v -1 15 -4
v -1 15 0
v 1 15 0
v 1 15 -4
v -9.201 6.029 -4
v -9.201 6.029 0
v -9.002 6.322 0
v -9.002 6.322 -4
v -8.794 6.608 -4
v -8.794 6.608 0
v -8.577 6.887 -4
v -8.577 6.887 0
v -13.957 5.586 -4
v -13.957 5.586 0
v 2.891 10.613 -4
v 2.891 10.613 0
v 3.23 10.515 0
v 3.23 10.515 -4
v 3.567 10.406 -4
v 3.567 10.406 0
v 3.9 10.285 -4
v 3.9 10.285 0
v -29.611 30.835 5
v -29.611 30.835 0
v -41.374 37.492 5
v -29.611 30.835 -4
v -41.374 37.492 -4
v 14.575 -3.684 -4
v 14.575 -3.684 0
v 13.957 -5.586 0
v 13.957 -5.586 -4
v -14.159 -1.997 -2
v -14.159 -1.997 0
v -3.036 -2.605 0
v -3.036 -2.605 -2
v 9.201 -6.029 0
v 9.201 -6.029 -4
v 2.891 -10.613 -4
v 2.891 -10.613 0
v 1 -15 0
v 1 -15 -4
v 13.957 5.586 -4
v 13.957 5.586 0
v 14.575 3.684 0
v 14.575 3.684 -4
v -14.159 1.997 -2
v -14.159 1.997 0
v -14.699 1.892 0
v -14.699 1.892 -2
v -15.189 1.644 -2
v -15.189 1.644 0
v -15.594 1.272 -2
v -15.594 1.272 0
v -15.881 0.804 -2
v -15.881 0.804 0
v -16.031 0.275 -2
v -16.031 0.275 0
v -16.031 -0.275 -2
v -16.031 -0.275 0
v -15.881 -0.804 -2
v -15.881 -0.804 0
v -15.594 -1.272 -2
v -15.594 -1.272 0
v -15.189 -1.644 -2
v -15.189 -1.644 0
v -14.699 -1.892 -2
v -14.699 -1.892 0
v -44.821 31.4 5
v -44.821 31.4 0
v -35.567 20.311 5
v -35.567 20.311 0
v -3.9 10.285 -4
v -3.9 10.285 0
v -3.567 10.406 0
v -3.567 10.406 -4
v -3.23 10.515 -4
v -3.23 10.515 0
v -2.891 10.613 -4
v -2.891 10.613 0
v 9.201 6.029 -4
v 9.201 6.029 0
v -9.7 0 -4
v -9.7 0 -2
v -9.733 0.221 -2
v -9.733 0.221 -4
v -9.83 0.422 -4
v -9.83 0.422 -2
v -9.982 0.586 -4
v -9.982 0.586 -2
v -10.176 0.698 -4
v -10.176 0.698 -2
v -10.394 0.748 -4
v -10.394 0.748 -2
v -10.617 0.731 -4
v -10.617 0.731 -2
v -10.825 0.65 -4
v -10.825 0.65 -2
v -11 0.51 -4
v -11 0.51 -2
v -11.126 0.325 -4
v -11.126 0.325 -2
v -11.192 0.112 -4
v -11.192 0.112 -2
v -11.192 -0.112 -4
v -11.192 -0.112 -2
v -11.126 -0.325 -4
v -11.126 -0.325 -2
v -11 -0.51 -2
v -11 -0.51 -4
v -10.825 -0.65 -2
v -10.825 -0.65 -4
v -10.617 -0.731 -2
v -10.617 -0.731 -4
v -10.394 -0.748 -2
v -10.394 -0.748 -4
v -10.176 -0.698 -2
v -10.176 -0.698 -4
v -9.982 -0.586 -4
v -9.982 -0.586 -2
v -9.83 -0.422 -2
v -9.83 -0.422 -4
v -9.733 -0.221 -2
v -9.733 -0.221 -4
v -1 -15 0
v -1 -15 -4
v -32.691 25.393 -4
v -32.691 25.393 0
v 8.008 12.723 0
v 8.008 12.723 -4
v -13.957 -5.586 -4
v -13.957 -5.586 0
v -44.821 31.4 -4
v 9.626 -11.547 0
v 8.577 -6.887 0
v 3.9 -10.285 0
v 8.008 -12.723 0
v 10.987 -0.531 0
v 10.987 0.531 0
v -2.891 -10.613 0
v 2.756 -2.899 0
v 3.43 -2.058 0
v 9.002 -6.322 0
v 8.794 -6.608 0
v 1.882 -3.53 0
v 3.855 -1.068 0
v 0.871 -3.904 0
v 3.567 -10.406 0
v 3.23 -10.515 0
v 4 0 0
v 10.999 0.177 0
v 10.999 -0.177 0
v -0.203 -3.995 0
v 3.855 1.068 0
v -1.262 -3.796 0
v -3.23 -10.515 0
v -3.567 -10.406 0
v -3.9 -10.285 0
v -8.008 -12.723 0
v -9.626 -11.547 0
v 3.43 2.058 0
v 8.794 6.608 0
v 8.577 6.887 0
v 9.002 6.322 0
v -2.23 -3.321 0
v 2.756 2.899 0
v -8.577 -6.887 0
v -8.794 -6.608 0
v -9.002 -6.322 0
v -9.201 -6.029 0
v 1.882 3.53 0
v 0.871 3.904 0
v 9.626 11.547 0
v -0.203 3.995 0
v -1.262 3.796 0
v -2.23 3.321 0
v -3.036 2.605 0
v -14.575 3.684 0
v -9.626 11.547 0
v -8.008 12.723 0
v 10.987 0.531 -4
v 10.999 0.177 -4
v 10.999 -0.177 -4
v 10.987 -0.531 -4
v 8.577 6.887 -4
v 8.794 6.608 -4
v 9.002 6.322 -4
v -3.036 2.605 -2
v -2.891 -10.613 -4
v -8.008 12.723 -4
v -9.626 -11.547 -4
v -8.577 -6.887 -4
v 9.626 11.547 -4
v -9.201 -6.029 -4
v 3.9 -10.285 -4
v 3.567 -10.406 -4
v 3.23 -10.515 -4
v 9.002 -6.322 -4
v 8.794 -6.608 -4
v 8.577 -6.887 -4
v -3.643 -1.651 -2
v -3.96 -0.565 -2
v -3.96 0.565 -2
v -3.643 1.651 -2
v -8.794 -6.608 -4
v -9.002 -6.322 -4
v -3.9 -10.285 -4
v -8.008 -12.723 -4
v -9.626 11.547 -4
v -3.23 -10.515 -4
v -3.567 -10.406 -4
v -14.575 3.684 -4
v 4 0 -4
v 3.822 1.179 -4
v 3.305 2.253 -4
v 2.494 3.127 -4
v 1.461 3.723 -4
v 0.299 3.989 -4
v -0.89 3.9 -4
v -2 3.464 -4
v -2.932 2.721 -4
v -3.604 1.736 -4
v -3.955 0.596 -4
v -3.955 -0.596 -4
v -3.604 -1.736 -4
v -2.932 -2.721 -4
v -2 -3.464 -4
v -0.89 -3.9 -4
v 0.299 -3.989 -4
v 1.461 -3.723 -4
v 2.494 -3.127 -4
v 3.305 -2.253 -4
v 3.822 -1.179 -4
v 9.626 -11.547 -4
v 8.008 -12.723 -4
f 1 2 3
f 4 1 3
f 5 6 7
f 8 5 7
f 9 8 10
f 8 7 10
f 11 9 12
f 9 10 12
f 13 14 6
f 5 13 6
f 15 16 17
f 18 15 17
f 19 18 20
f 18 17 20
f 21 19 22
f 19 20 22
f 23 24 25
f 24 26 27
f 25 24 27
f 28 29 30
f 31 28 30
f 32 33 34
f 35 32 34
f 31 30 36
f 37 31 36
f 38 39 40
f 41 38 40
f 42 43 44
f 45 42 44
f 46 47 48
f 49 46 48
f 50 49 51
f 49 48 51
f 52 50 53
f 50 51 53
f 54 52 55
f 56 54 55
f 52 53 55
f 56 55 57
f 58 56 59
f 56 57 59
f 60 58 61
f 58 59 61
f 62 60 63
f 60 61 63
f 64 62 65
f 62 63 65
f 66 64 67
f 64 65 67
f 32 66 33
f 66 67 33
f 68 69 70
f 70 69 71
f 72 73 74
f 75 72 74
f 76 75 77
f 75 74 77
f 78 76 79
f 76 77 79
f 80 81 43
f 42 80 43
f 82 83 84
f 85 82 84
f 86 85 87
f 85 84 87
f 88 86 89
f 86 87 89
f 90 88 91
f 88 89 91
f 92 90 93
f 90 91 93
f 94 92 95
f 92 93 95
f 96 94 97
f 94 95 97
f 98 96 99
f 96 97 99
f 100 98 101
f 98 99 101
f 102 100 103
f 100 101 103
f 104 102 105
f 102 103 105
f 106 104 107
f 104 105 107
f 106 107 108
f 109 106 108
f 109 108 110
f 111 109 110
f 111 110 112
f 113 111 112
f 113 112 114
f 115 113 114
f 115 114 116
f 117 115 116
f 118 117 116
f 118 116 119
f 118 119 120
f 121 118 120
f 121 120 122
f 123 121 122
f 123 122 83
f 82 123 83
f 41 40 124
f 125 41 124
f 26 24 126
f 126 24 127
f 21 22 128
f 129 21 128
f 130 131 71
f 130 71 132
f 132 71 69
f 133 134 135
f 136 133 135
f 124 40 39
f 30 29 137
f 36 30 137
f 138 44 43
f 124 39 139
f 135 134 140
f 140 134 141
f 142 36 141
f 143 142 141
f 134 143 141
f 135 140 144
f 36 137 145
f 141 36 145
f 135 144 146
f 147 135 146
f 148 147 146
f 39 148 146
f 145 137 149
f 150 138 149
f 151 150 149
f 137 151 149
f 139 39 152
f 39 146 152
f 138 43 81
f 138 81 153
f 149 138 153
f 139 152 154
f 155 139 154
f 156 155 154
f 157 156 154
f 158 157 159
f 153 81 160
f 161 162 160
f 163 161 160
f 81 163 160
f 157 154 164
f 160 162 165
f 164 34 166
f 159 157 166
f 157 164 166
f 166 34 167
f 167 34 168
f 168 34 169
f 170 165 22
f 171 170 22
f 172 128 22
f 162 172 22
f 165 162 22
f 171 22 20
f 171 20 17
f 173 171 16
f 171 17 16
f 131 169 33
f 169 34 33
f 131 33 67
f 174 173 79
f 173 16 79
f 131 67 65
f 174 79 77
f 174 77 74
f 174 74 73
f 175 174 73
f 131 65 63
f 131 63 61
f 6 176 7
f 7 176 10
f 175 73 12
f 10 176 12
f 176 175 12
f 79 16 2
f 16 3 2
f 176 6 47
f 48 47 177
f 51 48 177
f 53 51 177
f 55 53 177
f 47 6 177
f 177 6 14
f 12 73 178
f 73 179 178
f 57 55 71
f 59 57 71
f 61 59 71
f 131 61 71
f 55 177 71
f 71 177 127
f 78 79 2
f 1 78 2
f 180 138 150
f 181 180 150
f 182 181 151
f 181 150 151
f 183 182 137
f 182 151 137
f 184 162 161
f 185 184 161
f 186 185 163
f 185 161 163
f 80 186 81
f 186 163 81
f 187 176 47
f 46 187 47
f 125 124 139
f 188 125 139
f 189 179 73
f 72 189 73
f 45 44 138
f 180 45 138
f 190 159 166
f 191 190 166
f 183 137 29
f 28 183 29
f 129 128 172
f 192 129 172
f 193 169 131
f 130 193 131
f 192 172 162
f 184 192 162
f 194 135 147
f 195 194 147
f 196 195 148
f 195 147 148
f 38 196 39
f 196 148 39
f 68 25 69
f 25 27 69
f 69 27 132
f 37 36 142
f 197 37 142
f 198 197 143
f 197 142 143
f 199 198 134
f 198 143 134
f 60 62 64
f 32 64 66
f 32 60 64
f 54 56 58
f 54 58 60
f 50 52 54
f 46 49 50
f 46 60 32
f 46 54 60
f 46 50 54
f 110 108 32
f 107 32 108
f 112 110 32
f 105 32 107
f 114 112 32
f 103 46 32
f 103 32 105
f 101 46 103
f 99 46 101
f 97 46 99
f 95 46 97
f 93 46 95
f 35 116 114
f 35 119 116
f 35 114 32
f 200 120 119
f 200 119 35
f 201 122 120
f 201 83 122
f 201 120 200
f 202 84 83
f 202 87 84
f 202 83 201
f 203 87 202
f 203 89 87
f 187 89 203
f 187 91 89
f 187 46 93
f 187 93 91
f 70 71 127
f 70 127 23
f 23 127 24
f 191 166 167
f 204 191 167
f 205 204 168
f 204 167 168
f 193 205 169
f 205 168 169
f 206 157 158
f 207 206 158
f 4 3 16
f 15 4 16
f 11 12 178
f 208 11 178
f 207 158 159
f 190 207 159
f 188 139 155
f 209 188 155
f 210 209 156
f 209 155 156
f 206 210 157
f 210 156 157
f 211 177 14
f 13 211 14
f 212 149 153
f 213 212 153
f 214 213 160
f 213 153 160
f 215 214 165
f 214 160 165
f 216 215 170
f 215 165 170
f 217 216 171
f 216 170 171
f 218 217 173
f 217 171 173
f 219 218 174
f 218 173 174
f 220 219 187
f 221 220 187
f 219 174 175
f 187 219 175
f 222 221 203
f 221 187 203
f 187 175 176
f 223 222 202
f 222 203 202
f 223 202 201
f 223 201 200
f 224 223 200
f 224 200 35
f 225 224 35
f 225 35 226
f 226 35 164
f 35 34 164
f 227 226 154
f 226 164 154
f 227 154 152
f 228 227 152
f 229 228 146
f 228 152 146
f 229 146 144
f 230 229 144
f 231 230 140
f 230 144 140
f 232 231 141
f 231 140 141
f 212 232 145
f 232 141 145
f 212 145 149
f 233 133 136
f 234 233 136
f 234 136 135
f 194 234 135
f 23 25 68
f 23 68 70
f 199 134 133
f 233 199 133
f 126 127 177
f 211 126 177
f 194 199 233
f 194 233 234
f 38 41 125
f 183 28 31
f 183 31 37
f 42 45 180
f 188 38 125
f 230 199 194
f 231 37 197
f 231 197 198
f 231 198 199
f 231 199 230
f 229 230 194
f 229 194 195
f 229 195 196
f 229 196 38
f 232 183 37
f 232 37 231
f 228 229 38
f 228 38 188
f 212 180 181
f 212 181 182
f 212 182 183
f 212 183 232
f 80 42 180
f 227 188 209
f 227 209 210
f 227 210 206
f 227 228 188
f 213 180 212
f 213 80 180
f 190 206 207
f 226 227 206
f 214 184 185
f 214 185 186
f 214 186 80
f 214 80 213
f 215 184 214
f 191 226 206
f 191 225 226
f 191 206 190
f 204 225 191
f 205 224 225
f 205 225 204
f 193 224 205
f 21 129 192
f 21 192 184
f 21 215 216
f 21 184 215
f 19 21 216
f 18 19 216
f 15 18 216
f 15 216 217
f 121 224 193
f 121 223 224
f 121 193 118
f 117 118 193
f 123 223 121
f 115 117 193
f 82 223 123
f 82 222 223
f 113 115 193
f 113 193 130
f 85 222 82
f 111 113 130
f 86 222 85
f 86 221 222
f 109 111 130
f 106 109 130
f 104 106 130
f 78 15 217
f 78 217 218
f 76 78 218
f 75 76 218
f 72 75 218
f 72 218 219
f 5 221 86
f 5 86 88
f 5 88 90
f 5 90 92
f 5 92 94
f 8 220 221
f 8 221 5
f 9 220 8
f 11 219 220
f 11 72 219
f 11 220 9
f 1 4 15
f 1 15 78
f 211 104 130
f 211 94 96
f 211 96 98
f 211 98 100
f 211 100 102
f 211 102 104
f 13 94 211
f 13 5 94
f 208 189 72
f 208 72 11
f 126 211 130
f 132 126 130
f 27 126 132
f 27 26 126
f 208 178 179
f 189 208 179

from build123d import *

# Parameters (mm, degrees)
SKETCH1_R           = 3.5
BOSS_EXTRUDE1_DEPTH = 4
BOSS_EXTRUDE2_DEPTH = 4
CUT_EXTRUDE1_DEPTH  = 2
SKETCH5_R           = 0.75
CUT_EXTRUDE2_DEPTH  = 59.571601855
SKETCH6_R           = 4
CUT_EXTRUDE3_DEPTH  = 10
BOSS_EXTRUDE3_DEPTH = 5


with BuildPart() as part:
    # Sketch1 → Boss-Extrude1 (new body)
    with BuildSketch(Plane.XY):
        with BuildLine():
            Line((-1, 15), (1, 15))
            Line((1, 15), (2.890622598, 10.613401952))
            ThreePointArc((2.890622598, 10.613401952), (3.399186938, 10.461621679), (3.899838338, 10.28548788))
            Line((3.899838338, 10.28548788), (8.00776179, 12.723040168))
            Line((8.00776179, 12.723040168), (9.625795779, 11.547469663))
            Line((9.625795779, 11.547469663), (8.57696395, 6.887357214))
            ThreePointArc((8.57696395, 6.887357214), (8.899186938, 6.465637775), (9.200693579, 6.02886703))
            Line((9.200693579, 6.02886703), (13.95683075, 5.586311432))
            Line((13.95683075, 5.586311432), (14.574864739, 3.684198399))
            Line((14.574864739, 3.684198399), (10.987196594, 0.530576113))
            ThreePointArc((10.987196594, 0.530576113), (11, 0), (10.987196594, -0.530576113))
            Line((10.987196594, -0.530576113), (14.574864739, -3.684198399))
            Line((14.574864739, -3.684198399), (13.95683075, -5.586311432))
            Line((13.95683075, -5.586311432), (9.200693579, -6.02886703))
            ThreePointArc((9.200693579, -6.02886703), (8.899186938, -6.465637775), (8.57696395, -6.887357214))
            Line((8.57696395, -6.887357214), (9.625795779, -11.547469663))
            Line((9.625795779, -11.547469663), (8.00776179, -12.723040168))
            Line((8.00776179, -12.723040168), (3.899838338, -10.28548788))
            ThreePointArc((3.899838338, -10.28548788), (3.399186938, -10.461621679), (2.890622598, -10.613401952))
            Line((2.890622598, -10.613401952), (1, -15))
            Line((1, -15), (-1, -15))
            Line((-1, -15), (-2.890622598, -10.613401952))
            ThreePointArc((-2.890622598, -10.613401952), (-3.399186938, -10.461621679), (-3.899838338, -10.28548788))
            Line((-3.899838338, -10.28548788), (-8.00776179, -12.723040168))
            Line((-8.00776179, -12.723040168), (-9.625795779, -11.547469663))
            Line((-9.625795779, -11.547469663), (-8.57696395, -6.887357214))
            ThreePointArc((-8.57696395, -6.887357214), (-8.899186938, -6.465637775), (-9.200693579, -6.02886703))
            Line((-9.200693579, -6.02886703), (-13.95683075, -5.586311432))
            Line((-13.95683075, -5.586311432), (-14.574864739, -3.684198399))
            Line((-14.574864739, -3.684198399), (-10.987196594, -0.530576113))
            ThreePointArc((-10.987196594, -0.530576113), (-11, 0), (-10.987196594, 0.530576113))
            Line((-10.987196594, 0.530576113), (-14.574864739, 3.684198399))
            Line((-14.574864739, 3.684198399), (-13.95683075, 5.586311432))
            Line((-13.95683075, 5.586311432), (-9.200693579, 6.02886703))
            ThreePointArc((-9.200693579, 6.02886703), (-8.899186938, 6.465637775), (-8.57696395, 6.887357214))
            Line((-8.57696395, 6.887357214), (-9.625795779, 11.547469663))
            Line((-9.625795779, 11.547469663), (-8.00776179, 12.723040168))
            Line((-8.00776179, 12.723040168), (-3.899838338, 10.28548788))
            ThreePointArc((-3.899838338, 10.28548788), (-3.399186938, 10.461621679), (-2.890622598, 10.613401952))
            Line((-2.890622598, 10.613401952), (-1, 15))
        make_face()
        Circle(SKETCH1_R, mode=Mode.SUBTRACT)
    extrude(amount=-BOSS_EXTRUDE1_DEPTH)

    # Sketch3 → Boss-Extrude2 (add)
    with BuildSketch(Plane.XY):
        Polygon((-41.373550062, 37.492275487), (-29.610808295, 30.834868856), (-32.690631554, 25.393235547), (-14.574864739, 3.684198399), (-10.987196594, 0.530576113), (-10.987196594, -0.530576113), (-14.574864739, -3.684198399), (-13.95683075, -5.586311432), (-44.821443781, 31.400311198), align=None)
    extrude(amount=-BOSS_EXTRUDE2_DEPTH)

    # Sketch4 → Cut-Extrude1 (cut)
    with BuildSketch(Plane.XY):
        with BuildLine():
            Line((-14.159121967, -1.99702088), (-2.291588247, -2.645491127))
            ThreePointArc((-2.291588247, -2.645491127), (-3.5, 0), (-2.291588247, 2.645491127))
            Line((-2.291588247, 2.645491127), (-14.159121967, 1.99702088))
            ThreePointArc((-14.159121967, 1.99702088), (-16.05, 0), (-14.159121967, -1.99702088))
        make_face()
    extrude(amount=-CUT_EXTRUDE1_DEPTH, mode=Mode.SUBTRACT)

    # Sketch5 → Cut-Extrude2 (cut, through all)
    with BuildSketch(Plane.XY):
        with Locations((-10.45, 0)):
            Circle(SKETCH5_R)
    extrude(amount=-CUT_EXTRUDE2_DEPTH, mode=Mode.SUBTRACT)

    # Sketch6 → Cut-Extrude3 (cut)
    with BuildSketch(Plane.XY):
        Circle(SKETCH6_R)
    extrude(amount=-CUT_EXTRUDE3_DEPTH, mode=Mode.SUBTRACT)

    # Sketch7 → Boss-Extrude3 (add)
    with BuildSketch(Plane.XY):
        Polygon((-29.610808295, 30.834868856), (-41.373550062, 37.492275487), (-44.821443781, 31.400311198), (-35.567281633, 20.310581908), align=None)
    extrude(amount=BOSS_EXTRUDE3_DEPTH)


solid = part.part
